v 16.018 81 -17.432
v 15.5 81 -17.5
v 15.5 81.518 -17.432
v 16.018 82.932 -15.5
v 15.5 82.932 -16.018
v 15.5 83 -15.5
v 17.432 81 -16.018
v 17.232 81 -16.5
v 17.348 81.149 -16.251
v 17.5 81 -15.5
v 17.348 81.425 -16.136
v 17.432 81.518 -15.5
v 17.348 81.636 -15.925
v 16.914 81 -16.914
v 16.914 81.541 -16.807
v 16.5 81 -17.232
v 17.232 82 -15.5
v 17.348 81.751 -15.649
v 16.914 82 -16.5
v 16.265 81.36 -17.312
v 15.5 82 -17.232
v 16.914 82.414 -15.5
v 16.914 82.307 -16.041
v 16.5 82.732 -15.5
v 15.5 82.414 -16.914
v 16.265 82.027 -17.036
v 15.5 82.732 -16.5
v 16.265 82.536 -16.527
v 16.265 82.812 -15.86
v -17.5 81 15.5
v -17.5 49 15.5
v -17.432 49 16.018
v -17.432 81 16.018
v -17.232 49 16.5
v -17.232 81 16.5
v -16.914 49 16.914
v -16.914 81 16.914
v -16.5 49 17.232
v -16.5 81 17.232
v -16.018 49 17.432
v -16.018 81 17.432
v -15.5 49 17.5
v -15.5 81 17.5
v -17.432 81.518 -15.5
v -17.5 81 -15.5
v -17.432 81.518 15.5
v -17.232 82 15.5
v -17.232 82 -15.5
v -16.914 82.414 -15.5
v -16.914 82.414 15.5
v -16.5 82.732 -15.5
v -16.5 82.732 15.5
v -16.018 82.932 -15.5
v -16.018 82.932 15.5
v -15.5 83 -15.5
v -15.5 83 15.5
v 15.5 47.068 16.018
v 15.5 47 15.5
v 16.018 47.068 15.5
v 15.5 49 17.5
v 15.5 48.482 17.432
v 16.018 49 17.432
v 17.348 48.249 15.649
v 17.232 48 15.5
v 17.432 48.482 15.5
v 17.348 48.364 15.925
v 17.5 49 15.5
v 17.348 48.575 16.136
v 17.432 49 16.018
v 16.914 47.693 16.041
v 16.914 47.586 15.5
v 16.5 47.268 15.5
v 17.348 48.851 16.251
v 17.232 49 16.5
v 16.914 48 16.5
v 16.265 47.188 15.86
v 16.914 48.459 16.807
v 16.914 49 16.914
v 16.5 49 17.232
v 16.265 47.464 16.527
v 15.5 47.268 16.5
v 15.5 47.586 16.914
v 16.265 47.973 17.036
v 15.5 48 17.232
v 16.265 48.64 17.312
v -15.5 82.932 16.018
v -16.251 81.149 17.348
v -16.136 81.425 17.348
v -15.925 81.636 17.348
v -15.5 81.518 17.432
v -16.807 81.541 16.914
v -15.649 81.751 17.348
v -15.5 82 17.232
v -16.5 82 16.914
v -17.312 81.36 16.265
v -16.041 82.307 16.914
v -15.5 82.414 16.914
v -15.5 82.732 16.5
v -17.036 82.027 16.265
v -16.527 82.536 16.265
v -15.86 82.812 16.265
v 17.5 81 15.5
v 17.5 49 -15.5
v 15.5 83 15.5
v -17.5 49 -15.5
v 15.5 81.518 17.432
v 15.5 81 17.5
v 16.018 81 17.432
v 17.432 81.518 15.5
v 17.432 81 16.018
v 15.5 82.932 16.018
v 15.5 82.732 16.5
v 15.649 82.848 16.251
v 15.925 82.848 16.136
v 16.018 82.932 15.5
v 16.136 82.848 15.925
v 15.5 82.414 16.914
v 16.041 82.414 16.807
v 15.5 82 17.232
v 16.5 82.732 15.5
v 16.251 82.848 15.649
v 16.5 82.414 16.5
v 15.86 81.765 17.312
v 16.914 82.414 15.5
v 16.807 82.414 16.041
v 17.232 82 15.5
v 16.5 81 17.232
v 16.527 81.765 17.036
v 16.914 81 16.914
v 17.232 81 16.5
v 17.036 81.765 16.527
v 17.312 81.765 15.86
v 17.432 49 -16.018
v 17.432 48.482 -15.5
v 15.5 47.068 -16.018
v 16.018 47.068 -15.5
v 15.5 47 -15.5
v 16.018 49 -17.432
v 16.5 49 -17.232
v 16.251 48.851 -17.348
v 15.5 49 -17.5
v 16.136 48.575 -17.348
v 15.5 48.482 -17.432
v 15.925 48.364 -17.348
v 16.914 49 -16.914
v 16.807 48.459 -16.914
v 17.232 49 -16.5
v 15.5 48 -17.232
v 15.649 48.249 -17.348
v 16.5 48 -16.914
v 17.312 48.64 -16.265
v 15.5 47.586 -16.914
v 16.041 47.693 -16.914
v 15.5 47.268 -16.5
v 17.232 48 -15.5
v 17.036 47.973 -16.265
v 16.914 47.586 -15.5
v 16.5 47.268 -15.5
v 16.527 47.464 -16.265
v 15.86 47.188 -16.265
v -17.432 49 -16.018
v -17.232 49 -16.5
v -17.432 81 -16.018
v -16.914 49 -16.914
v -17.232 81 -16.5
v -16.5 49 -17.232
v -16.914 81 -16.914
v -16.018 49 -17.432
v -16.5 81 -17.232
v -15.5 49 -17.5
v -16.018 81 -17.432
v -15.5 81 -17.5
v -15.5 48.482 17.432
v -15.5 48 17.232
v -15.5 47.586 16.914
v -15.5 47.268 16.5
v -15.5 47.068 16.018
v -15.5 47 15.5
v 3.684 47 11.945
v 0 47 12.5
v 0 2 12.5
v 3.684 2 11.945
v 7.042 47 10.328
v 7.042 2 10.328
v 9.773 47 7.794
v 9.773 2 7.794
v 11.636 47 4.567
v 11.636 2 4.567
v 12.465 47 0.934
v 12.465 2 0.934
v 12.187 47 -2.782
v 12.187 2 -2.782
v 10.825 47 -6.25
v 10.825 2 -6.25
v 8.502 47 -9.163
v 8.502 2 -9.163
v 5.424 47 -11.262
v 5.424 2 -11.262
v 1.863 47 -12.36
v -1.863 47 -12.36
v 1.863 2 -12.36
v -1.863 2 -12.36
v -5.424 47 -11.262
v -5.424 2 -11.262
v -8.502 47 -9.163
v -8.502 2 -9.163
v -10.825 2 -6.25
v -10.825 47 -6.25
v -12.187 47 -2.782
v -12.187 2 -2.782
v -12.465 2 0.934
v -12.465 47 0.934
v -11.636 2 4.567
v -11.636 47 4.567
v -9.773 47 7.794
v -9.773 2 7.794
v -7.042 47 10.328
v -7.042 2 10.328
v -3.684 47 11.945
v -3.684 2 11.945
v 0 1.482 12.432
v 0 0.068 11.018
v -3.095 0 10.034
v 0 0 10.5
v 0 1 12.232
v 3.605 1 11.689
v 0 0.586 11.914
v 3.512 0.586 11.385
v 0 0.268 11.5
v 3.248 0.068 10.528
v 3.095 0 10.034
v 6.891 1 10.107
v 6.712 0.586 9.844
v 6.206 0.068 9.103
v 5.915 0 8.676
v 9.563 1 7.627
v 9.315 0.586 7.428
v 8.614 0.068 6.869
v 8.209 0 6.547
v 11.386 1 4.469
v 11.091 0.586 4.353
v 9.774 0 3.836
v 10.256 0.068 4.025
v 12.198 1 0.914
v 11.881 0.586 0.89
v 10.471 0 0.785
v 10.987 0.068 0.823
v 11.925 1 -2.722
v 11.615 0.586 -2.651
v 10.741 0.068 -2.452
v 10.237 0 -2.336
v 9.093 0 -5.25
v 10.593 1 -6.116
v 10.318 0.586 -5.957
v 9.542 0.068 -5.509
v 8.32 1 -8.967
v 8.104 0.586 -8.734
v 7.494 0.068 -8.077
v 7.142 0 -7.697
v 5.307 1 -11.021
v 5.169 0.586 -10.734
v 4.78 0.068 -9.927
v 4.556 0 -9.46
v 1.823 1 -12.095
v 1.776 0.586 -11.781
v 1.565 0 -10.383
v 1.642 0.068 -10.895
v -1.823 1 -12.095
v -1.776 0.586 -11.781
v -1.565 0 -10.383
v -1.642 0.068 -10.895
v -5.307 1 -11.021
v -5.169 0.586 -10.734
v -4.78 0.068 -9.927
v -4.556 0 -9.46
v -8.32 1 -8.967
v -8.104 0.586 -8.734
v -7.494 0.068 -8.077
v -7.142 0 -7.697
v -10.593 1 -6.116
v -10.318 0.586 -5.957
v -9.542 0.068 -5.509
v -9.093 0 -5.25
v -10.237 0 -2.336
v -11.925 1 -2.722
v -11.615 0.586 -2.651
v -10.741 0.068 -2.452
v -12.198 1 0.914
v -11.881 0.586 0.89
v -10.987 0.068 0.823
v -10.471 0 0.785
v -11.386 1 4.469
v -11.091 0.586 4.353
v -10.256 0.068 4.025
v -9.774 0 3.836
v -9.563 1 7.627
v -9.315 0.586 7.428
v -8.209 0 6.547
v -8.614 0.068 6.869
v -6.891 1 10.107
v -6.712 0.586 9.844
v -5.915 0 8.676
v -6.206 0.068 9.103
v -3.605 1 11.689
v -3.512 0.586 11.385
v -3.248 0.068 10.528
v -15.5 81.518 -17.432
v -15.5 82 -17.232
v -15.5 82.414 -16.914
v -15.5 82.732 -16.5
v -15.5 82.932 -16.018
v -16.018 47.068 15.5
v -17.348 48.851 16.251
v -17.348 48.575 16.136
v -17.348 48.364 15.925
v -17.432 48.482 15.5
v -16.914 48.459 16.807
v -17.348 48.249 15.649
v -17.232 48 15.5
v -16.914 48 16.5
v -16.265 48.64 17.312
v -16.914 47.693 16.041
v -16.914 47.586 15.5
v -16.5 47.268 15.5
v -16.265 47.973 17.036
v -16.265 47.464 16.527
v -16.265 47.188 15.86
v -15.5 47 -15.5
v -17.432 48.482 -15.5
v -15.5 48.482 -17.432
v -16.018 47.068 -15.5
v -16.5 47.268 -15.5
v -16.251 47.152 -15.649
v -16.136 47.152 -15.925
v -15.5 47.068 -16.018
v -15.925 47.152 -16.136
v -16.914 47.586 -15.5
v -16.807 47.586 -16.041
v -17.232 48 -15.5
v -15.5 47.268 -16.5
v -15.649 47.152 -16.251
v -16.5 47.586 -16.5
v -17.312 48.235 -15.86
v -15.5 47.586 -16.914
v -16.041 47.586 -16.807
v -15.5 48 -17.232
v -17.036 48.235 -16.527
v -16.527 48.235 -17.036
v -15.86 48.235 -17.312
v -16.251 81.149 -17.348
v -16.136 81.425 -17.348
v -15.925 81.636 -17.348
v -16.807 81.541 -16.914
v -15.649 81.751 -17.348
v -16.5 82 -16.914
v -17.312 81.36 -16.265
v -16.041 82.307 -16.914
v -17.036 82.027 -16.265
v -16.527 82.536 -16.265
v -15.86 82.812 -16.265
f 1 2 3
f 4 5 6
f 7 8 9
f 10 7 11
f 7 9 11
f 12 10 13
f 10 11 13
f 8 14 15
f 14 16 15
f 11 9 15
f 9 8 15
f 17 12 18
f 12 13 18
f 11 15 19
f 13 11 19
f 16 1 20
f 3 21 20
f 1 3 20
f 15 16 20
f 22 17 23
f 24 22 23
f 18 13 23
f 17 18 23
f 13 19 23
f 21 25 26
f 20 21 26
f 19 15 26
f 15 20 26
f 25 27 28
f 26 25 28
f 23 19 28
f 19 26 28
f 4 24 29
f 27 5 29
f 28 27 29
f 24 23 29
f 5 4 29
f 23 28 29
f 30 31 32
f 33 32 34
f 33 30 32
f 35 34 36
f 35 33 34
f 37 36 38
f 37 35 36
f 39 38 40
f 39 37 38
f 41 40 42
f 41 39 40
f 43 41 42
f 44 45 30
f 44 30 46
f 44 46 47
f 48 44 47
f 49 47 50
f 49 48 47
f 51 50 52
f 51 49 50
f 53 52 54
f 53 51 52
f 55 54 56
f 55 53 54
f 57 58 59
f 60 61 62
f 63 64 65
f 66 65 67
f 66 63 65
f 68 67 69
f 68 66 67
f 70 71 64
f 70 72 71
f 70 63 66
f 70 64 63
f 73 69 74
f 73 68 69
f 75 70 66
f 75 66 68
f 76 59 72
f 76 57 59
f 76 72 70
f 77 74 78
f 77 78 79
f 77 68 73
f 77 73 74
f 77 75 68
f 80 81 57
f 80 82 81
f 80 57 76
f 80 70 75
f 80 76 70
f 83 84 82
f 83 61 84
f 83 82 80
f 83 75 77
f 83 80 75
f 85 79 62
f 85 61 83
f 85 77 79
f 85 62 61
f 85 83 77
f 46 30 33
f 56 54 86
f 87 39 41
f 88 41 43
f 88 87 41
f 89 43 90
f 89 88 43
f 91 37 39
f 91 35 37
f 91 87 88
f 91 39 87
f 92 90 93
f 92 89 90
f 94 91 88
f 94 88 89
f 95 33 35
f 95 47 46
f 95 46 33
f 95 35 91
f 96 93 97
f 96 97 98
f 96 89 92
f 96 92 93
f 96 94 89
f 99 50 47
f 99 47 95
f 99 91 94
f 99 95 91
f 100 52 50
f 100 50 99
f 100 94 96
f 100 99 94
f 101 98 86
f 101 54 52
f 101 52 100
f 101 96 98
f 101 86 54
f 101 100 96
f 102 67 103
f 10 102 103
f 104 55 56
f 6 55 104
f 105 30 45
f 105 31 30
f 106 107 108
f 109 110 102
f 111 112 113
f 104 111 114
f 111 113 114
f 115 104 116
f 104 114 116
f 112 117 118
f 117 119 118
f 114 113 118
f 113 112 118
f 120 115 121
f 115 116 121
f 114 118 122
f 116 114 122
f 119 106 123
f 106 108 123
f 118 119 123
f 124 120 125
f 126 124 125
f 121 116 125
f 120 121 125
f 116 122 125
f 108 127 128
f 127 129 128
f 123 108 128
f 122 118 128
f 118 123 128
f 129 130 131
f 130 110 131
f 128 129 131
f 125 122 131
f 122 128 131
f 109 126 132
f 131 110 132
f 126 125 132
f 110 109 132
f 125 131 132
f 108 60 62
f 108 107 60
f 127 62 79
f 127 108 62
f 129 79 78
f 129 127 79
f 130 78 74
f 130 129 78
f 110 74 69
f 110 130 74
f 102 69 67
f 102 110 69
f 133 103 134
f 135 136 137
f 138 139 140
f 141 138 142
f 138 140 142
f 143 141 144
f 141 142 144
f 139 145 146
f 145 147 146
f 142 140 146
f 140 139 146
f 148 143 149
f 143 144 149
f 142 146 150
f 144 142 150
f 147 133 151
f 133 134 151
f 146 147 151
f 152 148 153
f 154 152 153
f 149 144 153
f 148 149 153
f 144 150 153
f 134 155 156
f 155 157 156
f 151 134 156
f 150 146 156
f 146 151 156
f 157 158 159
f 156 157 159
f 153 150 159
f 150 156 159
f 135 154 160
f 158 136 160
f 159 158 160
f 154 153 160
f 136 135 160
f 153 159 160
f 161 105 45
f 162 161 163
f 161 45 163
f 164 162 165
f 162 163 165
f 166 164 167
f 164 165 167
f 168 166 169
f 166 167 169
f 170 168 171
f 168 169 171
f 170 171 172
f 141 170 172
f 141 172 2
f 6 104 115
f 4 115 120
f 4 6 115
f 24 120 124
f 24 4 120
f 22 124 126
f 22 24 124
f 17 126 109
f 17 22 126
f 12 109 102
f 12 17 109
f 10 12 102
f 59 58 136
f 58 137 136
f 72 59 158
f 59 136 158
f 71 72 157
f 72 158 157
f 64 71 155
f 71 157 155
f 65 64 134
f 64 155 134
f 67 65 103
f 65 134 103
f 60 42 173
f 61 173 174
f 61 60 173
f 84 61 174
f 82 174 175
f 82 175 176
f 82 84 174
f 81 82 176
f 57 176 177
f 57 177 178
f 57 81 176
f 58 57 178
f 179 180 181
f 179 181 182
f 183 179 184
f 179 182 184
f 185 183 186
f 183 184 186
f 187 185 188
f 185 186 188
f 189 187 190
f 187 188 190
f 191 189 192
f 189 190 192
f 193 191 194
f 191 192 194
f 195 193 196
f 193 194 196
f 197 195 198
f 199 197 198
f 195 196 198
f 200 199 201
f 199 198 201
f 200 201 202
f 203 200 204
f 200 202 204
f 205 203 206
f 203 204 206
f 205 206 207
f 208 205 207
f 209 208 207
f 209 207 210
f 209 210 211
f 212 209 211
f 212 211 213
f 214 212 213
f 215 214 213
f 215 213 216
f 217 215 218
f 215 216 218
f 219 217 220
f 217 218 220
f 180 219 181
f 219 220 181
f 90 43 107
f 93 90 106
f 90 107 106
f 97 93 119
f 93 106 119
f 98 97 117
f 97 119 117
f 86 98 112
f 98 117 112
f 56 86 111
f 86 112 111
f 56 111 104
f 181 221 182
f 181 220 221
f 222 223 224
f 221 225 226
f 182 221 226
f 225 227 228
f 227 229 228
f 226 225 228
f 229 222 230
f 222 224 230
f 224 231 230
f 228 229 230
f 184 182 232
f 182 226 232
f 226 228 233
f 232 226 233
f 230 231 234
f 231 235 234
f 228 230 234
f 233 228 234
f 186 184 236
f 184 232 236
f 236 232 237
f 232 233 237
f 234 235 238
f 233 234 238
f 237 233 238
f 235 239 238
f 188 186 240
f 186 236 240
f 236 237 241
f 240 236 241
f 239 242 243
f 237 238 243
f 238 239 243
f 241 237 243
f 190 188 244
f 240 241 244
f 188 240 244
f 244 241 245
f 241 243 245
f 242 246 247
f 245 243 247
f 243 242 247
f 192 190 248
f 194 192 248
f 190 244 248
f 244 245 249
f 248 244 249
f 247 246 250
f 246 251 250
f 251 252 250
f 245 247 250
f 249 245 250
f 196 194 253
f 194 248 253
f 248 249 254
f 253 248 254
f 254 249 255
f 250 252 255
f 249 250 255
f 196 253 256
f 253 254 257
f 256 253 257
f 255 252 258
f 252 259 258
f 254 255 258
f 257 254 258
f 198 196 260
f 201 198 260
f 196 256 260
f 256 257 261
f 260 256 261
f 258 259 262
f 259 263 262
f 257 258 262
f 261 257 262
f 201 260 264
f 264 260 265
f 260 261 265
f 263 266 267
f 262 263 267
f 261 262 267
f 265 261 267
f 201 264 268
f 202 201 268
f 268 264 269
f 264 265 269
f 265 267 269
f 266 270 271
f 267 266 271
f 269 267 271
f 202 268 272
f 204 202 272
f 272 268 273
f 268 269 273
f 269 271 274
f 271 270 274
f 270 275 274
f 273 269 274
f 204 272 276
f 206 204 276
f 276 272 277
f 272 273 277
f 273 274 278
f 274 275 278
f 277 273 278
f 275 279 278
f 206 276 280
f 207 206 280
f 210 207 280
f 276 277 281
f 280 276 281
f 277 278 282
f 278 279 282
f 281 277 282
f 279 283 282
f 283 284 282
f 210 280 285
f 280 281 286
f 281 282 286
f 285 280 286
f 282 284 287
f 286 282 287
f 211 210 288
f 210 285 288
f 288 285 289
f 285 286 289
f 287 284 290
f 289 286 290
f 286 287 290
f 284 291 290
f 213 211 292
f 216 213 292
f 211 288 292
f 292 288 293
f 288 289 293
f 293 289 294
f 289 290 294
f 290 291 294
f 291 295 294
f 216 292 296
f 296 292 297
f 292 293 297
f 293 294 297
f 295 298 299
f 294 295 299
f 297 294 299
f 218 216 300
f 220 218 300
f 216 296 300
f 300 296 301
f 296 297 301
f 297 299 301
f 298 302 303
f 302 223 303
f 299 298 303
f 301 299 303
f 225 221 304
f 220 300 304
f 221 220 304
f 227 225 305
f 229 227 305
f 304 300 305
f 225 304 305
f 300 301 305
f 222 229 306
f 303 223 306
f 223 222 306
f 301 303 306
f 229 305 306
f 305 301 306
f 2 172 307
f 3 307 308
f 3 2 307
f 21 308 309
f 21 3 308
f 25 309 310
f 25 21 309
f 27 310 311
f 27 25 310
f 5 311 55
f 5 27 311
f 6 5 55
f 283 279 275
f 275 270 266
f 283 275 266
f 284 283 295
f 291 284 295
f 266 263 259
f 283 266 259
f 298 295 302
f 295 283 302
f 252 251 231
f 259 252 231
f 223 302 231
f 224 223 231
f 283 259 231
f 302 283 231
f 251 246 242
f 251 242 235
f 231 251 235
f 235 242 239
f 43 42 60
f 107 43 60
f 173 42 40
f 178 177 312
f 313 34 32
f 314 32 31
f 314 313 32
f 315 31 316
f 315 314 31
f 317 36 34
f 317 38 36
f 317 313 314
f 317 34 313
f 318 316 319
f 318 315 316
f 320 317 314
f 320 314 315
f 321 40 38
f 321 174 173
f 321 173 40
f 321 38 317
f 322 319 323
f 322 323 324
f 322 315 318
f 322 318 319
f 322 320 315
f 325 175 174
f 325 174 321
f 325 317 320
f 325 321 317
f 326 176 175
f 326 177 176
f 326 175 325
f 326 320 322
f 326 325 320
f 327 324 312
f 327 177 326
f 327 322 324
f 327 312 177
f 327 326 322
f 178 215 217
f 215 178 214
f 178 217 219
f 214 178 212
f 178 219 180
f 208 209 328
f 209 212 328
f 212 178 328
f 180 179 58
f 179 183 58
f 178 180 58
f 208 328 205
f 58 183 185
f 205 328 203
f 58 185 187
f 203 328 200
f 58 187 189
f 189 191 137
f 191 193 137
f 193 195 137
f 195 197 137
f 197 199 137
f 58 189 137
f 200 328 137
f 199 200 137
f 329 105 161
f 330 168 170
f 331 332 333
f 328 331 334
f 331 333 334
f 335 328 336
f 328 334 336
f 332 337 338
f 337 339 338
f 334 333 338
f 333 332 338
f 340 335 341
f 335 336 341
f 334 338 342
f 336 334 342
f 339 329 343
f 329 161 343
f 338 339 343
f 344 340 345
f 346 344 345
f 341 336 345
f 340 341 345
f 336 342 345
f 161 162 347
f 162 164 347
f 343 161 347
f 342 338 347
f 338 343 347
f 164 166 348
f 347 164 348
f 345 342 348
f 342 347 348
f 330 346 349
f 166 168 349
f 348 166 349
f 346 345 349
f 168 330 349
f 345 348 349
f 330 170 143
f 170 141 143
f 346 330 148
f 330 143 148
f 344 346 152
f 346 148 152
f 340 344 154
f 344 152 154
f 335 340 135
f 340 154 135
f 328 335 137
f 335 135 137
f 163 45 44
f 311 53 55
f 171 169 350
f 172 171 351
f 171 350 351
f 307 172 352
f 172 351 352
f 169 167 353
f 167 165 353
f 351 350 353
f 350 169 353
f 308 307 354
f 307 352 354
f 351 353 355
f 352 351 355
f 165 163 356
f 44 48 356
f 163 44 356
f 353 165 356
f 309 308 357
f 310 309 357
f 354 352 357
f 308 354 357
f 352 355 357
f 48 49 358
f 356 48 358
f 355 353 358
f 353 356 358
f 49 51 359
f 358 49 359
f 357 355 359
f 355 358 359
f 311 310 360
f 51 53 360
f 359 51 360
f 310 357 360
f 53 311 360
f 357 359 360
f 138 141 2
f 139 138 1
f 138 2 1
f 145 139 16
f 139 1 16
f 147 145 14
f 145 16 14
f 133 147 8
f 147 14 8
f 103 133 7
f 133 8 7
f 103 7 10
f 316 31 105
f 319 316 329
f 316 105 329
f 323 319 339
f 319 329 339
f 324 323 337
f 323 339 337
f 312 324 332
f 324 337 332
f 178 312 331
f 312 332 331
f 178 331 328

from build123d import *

# Parameters (mm, degrees)
SKETCH1_R           = 12.5
BOSS_EXTRUDE1_DEPTH = 47
SKETCH2_W           = 35
SKETCH2_H           = 35
BOSS_EXTRUDE2_DEPTH = 36
FILLET1_R           = 2


with BuildPart() as part:
    # Sketch1 → Boss-Extrude1 (new body)
    with BuildSketch(Plane(origin=(0, 0, 0), x_dir=(1, 0, 0), z_dir=(0, 1, 0))):
        with Locations(Location((0, 0, 0), (0, 0, 270))):
            Circle(SKETCH1_R)
    extrude(amount=BOSS_EXTRUDE1_DEPTH)

    # Sketch2 → Boss-Extrude2 (add)
    with BuildSketch(Plane(origin=(0, 47, 0), x_dir=(1, 0, 0), z_dir=(0, 1, 0))):
        Rectangle(SKETCH2_W, SKETCH2_H)
    extrude(amount=BOSS_EXTRUDE2_DEPTH)

    # Fillet1
    fillet1_edges = [part.edges().sort_by_distance(p)[0] for p in [
        (0, 0, -12.5),
        (-17.5, 83, 0),
        (-17.5, 65, -17.5),
        (0, 47, 17.5),
        (-17.5, 65, 17.5),
        (17.5, 47, 0),
        (17.5, 65, 17.5),
        (0, 83, -17.5),
        (17.5, 65, -17.5),
        (0, 83, 17.5),
        (17.5, 83, 0),
        (-17.5, 47, 0),
        (0, 47, -17.5),
    ]]
    fillet(fillet1_edges, radius=FILLET1_R)


solid = part.part
